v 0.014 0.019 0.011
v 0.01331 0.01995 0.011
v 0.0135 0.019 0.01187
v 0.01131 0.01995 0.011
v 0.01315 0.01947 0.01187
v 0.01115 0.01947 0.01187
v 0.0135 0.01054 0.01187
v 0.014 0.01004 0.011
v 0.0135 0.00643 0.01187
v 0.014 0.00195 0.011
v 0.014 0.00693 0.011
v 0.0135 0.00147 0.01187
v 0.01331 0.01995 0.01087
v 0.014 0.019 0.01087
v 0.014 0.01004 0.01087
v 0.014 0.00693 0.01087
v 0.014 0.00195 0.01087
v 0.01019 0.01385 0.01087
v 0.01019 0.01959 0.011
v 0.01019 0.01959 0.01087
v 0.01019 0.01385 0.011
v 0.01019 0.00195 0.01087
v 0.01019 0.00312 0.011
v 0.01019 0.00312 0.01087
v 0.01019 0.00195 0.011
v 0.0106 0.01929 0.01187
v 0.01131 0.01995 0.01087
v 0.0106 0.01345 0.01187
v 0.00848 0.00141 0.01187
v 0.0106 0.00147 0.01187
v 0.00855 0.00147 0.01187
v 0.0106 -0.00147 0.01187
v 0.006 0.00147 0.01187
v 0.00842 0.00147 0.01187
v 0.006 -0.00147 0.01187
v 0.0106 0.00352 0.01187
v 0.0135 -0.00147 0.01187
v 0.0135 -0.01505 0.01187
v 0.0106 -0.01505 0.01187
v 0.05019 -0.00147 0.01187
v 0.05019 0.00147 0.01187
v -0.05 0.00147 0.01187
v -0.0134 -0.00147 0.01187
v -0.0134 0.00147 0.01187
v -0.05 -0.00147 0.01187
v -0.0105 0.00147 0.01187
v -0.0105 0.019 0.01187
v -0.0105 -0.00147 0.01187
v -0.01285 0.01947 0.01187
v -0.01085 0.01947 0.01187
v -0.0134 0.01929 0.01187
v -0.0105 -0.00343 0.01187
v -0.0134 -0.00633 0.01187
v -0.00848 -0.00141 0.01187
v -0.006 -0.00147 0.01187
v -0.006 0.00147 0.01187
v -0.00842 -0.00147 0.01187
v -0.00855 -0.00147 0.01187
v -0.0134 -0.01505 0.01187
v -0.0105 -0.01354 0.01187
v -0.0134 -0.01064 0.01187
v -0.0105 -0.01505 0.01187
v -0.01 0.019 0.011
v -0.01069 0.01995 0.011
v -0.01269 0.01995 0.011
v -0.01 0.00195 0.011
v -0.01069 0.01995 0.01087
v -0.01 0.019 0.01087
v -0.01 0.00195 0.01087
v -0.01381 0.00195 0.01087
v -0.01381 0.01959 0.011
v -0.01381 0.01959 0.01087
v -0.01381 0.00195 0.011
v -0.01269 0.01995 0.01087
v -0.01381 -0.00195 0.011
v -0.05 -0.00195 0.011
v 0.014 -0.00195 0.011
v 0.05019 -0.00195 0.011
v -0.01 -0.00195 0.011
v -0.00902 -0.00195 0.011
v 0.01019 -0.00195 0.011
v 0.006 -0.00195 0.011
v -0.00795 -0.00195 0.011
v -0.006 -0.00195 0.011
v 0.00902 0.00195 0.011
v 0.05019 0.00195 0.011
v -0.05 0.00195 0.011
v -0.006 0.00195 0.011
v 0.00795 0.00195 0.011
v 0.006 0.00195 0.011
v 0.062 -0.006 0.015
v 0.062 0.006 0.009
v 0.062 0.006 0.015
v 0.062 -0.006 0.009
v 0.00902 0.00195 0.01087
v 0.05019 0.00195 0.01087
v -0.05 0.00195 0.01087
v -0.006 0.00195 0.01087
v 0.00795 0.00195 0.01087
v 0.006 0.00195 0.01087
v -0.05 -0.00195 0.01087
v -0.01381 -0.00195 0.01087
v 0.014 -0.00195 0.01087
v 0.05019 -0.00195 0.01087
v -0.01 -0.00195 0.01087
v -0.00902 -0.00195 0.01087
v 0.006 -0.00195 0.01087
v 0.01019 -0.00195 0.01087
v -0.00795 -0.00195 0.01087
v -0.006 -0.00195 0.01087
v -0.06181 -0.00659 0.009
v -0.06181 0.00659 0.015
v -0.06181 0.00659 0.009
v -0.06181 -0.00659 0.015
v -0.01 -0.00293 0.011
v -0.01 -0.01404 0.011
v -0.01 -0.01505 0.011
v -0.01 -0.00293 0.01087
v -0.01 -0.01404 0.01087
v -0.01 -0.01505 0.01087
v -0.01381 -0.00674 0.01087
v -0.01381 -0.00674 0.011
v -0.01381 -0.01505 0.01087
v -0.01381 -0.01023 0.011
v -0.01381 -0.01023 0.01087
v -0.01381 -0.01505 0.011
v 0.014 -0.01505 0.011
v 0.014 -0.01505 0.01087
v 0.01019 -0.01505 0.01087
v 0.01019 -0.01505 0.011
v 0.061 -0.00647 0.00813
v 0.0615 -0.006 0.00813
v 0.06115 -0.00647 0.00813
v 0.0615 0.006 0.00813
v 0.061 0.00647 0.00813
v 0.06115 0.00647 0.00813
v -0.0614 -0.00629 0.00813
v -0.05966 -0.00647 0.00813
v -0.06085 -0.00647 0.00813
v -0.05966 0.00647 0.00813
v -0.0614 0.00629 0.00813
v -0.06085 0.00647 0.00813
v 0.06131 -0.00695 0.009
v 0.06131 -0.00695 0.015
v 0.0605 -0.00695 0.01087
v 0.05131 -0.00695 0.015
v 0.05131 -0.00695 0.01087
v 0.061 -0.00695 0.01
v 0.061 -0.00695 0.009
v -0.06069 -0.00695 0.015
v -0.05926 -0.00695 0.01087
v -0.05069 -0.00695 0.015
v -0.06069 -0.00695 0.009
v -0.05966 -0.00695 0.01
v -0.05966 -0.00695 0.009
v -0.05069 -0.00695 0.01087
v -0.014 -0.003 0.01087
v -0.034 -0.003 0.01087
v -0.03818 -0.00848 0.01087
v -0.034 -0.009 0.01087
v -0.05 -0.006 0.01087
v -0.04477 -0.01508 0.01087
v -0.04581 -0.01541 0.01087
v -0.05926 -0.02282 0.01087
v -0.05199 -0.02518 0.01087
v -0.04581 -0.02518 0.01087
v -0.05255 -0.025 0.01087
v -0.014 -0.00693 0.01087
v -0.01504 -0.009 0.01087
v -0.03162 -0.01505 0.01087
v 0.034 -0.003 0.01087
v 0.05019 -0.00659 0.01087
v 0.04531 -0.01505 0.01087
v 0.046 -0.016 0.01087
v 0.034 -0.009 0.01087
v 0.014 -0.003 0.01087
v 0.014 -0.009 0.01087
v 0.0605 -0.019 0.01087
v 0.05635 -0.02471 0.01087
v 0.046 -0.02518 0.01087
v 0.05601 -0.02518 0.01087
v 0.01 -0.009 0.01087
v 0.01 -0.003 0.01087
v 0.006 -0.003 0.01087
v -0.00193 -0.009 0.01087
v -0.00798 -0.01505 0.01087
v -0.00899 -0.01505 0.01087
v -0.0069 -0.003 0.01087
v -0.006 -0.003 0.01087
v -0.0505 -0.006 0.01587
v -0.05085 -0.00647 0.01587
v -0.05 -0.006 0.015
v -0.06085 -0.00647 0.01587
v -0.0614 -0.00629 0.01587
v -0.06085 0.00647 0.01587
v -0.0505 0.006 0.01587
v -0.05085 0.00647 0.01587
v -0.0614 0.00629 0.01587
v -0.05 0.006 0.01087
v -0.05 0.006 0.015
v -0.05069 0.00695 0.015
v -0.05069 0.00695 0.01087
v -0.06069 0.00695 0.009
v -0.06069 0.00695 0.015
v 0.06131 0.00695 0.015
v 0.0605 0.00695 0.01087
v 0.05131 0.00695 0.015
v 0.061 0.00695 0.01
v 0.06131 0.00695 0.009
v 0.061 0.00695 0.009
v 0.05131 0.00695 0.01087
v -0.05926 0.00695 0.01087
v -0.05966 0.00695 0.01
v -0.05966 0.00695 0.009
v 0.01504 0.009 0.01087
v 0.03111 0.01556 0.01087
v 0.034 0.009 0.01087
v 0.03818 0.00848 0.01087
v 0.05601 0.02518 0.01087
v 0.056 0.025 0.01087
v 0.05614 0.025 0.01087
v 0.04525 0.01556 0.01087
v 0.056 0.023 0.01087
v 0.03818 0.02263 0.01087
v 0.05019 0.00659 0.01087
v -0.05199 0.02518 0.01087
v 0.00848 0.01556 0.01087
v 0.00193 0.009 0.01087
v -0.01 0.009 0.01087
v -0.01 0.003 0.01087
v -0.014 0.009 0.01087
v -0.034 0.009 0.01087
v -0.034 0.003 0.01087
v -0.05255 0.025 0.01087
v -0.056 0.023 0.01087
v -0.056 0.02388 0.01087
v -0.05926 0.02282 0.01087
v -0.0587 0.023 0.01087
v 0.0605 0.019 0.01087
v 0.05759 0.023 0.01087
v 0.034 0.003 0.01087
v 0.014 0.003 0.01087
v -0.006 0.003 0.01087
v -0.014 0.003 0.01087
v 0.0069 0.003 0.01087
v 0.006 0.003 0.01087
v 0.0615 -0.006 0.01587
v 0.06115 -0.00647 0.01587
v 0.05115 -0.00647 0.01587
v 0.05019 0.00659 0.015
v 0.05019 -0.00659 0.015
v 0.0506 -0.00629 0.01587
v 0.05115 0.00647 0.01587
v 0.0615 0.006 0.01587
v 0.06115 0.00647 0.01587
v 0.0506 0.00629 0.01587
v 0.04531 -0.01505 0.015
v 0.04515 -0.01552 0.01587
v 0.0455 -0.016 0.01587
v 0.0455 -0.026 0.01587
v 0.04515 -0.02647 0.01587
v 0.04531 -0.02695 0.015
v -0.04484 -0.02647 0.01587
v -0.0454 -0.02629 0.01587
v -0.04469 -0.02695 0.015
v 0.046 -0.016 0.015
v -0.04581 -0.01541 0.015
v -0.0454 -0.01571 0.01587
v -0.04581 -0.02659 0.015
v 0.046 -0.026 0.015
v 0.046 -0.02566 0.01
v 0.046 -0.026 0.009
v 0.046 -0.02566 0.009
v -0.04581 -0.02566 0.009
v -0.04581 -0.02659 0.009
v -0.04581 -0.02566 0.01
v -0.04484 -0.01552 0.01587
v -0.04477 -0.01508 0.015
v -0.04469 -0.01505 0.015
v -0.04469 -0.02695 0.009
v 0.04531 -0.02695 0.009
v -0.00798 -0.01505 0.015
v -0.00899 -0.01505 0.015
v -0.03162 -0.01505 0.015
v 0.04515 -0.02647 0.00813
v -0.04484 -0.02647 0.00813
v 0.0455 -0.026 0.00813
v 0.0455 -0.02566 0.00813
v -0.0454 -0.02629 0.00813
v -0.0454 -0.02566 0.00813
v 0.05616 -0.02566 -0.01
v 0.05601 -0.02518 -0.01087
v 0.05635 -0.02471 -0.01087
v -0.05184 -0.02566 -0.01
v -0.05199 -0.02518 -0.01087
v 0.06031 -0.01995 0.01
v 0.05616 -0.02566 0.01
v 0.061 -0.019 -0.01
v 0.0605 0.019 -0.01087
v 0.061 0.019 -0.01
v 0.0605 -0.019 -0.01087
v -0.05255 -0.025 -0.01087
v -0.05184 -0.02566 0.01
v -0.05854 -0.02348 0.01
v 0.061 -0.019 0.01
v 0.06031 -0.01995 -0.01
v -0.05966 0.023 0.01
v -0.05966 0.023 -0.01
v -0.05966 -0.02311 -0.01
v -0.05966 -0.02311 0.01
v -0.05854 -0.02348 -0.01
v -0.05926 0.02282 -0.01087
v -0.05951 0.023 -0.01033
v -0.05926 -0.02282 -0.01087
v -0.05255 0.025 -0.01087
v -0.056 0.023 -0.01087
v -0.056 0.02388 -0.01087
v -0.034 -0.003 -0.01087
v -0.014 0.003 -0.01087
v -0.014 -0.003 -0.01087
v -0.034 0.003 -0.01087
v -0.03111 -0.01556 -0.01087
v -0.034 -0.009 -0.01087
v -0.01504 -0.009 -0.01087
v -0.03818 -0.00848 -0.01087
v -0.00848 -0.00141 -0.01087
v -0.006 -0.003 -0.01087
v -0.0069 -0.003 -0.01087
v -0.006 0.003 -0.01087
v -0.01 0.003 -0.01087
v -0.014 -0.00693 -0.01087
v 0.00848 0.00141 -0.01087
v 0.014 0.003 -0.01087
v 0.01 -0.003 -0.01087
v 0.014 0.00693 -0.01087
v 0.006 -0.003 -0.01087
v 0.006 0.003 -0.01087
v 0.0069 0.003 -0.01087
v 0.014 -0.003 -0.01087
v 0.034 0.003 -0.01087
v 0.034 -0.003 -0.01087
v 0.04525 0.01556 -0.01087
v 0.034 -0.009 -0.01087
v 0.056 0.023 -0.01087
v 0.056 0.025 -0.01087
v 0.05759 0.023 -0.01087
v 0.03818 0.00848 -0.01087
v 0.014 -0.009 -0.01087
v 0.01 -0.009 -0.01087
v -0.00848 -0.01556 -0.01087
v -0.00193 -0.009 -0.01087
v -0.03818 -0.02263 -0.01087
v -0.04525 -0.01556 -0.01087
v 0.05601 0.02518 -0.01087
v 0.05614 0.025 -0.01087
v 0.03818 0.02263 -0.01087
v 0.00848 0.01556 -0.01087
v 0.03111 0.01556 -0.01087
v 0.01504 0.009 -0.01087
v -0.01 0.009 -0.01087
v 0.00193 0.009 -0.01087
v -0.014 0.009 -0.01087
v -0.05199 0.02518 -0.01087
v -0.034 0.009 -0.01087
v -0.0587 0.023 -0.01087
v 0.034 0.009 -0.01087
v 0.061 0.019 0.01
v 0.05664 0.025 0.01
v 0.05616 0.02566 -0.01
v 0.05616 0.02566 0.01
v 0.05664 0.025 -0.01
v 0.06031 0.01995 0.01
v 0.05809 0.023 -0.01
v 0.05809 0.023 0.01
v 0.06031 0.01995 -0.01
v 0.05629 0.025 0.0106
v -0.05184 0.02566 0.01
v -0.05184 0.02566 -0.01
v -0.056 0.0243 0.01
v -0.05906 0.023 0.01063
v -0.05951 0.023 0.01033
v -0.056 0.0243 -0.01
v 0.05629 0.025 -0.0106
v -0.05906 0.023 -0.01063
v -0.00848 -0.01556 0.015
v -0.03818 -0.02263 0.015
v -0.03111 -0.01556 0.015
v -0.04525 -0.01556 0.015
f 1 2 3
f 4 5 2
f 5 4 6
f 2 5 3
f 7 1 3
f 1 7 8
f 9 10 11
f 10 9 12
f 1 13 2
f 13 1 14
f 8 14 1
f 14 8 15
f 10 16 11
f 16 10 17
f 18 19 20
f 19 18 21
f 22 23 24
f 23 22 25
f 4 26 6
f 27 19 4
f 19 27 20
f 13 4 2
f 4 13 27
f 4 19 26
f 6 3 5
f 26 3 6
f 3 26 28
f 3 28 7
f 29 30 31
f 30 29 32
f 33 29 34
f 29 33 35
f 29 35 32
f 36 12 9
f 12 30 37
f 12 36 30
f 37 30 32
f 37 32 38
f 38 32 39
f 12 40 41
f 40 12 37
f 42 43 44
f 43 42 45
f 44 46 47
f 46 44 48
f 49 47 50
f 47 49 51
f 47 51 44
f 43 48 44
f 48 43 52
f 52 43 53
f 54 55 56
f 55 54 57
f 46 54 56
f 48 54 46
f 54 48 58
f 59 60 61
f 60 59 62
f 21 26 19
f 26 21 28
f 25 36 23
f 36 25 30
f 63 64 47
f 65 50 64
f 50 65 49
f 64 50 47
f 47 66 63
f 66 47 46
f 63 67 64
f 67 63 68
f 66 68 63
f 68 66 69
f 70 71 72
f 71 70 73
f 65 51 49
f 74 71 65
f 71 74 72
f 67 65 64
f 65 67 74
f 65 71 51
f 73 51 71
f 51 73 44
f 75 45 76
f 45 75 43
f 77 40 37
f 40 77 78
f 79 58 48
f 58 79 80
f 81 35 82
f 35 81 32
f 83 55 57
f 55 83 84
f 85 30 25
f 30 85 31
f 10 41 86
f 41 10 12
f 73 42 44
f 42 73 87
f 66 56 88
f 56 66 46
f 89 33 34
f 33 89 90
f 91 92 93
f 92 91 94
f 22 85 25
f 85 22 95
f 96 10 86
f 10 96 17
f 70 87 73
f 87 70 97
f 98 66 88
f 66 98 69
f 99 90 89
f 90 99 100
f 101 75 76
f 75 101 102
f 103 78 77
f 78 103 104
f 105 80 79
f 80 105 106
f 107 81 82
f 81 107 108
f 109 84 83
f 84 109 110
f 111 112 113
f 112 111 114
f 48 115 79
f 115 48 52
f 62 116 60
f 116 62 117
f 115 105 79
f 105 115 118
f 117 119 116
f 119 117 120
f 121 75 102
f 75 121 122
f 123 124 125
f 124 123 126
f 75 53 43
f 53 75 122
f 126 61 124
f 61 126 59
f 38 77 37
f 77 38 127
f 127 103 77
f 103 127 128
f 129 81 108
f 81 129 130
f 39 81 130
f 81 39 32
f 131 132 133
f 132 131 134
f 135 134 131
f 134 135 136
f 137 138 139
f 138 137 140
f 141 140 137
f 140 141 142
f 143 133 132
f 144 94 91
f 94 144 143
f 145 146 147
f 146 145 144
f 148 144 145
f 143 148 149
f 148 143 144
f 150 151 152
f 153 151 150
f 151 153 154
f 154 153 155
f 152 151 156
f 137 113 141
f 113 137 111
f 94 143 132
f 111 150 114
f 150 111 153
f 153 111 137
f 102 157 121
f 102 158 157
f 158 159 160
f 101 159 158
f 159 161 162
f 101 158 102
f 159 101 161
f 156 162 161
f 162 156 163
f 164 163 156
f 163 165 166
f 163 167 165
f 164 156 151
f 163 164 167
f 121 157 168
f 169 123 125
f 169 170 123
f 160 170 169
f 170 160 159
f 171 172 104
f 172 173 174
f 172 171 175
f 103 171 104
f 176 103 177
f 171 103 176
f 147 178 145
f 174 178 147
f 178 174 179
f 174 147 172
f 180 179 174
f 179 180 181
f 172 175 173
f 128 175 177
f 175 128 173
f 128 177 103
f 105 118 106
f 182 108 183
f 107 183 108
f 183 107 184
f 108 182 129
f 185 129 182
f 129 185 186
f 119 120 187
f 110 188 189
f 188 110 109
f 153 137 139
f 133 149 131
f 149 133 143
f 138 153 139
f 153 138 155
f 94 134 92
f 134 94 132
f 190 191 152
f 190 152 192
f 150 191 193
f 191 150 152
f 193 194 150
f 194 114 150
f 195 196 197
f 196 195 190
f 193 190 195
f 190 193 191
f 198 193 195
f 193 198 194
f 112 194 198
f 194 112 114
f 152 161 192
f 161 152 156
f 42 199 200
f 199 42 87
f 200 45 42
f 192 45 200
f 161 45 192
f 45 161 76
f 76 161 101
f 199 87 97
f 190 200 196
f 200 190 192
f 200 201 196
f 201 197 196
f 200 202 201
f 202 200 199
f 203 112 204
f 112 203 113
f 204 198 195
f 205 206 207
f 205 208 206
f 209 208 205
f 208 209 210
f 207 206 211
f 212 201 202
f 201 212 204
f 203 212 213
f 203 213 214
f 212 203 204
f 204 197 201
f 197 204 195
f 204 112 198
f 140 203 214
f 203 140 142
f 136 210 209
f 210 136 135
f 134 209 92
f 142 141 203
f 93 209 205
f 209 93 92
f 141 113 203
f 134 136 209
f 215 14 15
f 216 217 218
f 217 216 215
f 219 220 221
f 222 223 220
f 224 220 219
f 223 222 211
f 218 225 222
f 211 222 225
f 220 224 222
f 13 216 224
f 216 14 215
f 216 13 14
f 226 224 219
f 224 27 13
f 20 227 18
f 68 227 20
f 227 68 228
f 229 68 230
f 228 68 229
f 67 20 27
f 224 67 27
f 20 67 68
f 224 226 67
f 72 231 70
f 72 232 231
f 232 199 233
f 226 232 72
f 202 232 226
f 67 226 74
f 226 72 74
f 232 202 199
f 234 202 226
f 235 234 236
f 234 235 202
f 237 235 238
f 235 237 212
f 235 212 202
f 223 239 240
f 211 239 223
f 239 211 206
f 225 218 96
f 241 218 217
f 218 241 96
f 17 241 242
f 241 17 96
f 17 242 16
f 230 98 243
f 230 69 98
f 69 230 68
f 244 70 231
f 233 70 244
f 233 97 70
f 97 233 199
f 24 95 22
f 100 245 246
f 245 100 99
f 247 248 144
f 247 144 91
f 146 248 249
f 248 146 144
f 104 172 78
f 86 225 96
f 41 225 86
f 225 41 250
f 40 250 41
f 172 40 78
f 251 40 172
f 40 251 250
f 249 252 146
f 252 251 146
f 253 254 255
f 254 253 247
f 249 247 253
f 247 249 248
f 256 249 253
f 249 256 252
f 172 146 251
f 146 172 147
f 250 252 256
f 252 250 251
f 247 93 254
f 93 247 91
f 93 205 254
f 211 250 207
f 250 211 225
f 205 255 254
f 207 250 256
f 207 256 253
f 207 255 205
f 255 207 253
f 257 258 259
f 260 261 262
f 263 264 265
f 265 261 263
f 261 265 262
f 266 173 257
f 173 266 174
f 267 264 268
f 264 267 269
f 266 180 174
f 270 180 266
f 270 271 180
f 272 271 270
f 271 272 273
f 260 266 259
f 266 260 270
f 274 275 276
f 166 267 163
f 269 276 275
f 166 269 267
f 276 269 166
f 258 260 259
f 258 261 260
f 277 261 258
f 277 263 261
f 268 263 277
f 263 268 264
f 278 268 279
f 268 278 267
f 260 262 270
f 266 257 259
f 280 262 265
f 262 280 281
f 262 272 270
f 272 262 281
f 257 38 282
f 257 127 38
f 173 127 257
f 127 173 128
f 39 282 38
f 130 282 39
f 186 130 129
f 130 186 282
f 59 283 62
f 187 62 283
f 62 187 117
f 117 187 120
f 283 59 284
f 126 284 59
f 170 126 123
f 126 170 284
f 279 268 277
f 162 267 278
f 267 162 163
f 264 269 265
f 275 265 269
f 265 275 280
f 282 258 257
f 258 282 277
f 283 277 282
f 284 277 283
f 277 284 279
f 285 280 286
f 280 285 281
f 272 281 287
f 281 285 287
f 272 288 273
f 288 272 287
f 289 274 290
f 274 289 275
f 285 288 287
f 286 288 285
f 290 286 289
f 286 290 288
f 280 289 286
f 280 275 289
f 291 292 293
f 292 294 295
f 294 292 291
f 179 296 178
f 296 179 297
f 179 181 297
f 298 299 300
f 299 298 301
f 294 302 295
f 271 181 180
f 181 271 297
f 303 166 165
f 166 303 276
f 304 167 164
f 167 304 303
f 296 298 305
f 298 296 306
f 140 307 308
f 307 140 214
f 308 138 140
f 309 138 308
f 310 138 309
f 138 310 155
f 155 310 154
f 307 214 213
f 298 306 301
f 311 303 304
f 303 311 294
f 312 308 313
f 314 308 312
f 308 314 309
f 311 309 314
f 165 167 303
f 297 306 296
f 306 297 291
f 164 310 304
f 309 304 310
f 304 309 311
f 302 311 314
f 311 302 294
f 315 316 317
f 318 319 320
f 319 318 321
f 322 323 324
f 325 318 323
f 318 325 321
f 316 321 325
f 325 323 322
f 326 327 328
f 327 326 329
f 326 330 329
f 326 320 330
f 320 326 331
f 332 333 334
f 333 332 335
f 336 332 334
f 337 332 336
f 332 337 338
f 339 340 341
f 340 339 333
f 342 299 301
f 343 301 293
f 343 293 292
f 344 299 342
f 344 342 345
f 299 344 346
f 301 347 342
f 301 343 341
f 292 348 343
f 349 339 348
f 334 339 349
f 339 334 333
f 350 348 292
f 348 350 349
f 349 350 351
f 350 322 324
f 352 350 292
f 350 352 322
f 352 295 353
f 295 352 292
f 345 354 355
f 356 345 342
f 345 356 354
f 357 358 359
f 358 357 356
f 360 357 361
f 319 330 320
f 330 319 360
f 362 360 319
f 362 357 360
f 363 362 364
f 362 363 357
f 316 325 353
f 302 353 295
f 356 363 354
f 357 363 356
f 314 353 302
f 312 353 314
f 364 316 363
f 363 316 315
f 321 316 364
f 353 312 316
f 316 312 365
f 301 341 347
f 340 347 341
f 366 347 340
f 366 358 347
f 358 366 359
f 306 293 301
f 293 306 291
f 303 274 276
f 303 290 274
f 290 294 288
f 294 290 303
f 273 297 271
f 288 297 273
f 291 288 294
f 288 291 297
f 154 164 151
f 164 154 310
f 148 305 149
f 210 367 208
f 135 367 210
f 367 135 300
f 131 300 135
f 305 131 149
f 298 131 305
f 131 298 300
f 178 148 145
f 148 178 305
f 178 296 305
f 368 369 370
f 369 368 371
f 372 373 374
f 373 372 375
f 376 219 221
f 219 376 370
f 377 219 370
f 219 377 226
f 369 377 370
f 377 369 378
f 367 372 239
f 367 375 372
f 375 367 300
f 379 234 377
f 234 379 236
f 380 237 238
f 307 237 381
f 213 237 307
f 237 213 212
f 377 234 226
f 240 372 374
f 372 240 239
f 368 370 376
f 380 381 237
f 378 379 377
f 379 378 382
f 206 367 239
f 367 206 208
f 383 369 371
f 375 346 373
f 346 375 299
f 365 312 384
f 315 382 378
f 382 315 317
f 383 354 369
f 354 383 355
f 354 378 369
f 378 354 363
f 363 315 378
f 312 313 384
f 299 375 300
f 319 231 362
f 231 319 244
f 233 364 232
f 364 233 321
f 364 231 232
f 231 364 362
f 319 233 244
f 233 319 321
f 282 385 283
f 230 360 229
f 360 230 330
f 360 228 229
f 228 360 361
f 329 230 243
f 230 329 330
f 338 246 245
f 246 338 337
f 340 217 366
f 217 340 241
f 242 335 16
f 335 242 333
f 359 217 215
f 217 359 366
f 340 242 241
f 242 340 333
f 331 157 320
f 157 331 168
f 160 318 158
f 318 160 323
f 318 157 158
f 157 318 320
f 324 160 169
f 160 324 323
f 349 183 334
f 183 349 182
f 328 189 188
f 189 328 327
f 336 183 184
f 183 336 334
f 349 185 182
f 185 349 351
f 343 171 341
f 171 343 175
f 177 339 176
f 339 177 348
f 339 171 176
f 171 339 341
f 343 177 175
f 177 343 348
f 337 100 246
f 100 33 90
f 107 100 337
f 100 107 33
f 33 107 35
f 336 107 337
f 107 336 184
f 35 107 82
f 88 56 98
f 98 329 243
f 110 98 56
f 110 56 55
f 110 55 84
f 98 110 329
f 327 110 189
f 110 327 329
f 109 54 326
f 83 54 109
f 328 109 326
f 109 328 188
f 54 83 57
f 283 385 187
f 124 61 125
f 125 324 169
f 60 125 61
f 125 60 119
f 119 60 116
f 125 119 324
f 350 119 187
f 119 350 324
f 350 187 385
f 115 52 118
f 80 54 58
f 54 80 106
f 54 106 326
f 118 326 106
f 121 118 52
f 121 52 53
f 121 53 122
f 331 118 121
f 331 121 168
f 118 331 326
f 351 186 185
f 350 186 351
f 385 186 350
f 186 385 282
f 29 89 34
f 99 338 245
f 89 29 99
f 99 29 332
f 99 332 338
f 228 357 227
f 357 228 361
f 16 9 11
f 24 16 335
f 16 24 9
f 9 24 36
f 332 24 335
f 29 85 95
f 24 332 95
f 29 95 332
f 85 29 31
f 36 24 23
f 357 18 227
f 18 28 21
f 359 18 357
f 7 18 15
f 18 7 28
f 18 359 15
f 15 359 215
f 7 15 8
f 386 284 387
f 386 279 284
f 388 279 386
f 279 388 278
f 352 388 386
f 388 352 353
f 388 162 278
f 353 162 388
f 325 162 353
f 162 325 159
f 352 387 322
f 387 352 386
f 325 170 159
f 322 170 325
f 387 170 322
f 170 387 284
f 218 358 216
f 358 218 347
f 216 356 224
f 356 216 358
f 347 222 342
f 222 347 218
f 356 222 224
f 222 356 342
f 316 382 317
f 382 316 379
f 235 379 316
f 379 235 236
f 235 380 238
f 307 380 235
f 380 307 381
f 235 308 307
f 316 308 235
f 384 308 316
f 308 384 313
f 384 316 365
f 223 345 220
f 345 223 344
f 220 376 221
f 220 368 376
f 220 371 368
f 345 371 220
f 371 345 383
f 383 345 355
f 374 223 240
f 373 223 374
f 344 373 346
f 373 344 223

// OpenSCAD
// Parameters
L = 0.12; //[0.06:0.24:0.001]
W = 0.05; //[0.025:0.1:0.001]
T = 0.02; //[0.01:0.04:0.001]
corner_r = 0.006; //[0.003:0.012:0.001]
edge_margin_x = 0.008; //[0.004:0.016:0.001]
edge_margin_y = 0.006; //[0.003:0.012:0.001]
slot_len = 0.02; //[0.01:0.04:0.001]
slot_w = 0.006; //[0.003:0.012:0.001]
slot_hex_flat = 0.006; //[0.003:0.012:0.001]
slot_row_pitch_y = 0.012; //[0.006:0.024:0.001]
slot_col_pitch_x = 0.024; //[0.012:0.048:0.001]
diamond_w = 0.01; //[0.005:0.02:0.001]
diamond_h = 0.01; //[0.005:0.02:0.001]
diamond_offset_x = 0.0; //[0.0:0.02:0.001]
diamond_offset_y = 0.0; //[0.0:0.02:0.001]
tri_side = 0.01; //[0.005:0.02:0.001]
tri_offset_x = 0.038; //[0.019:0.076:0.001]
tri_offset_y = 0.016; //[0.008:0.032:0.001]
step_len = 0.09; //[0.045:0.18:0.001]
step_w = 0.01; //[0.005:0.02:0.001]
step_h = 0.006; //[0.003:0.012:0.001]
step_edge_offset_y = 0.0; //[-0.01:0.01:0.001]
end_block_len = 0.01; //[0.005:0.02:0.001]
end_block_w = 0.012; //[0.006:0.024:0.001]
end_block_h = 0.006; //[0.003:0.012:0.001]
end_block_chamfer = 0.003; //[0.0015:0.006:0.0005]
micro_round_r = 0.001; //[0.0005:0.002:0.0005]
overlap = 0.001; //[0.0005:0.002:0.0005]
cut_extra_z = 0.01; //[0.005:0.02:0.001]
rib_w = 0.002; //[0.001:0.004:0.0005]
rib_h = 0.002; //[0.001:0.004:0.0005]
notch_w = 0.004; //[0.002:0.008:0.001]
notch_d = 0.002; //[0.001:0.004:0.0005]

// Base Shapes
module rr_corner_cyl_1() {
  translate([L/2 - corner_r, W/2 - corner_r, 0])
    cylinder(r=corner_r, h=T, center=true);
}

module rr_corner_cyl_2() {
  translate([-L/2 + corner_r, W/2 - corner_r, 0])
    cylinder(r=corner_r, h=T, center=true);
}

module rr_corner_cyl_3() {
  translate([-L/2 + corner_r, -W/2 + corner_r, 0])
    cylinder(r=corner_r, h=T, center=true);
}

module rr_corner_cyl_4() {
  translate([L/2 - corner_r, -W/2 + corner_r, 0])
    cylinder(r=corner_r, h=T, center=true);
}

module step_base_raw() {
  translate([0, -W/2 + step_w/2 + step_edge_offset_y - overlap, T/2 + step_h/2 - overlap])
    cube([step_len, step_w, step_h], center=true);
}

module end_block_left_big() {
  translate([-L/2 + end_block_len/2 - overlap, 0, T/2 + end_block_h/2 - overlap])
    cube([end_block_len, end_block_w, end_block_h], center=true);
}

module end_block_left_small() {
  translate([-L/2 + end_block_len/2 - overlap, 0, T/2 + end_block_h/2 - overlap])
    cube([end_block_len - 2*end_block_chamfer, end_block_w - 2*end_block_chamfer, end_block_h], center=true);
}

module end_block_right_big() {
  translate([L/2 - end_block_len/2 + overlap, 0, T/2 + end_block_h/2 - overlap])
    cube([end_block_len, end_block_w, end_block_h], center=true);
}

module end_block_right_small() {
  translate([L/2 - end_block_len/2 + overlap, 0, T/2 + end_block_h/2 - overlap])
    cube([end_block_len - 2*end_block_chamfer, end_block_w - 2*end_block_chamfer, end_block_h], center=true);
}

module rib_between_rows_1() {
  translate([0, 0, T/2 + rib_h/2 - overlap])
    cube([L - 2*edge_margin_x, rib_w, rib_h], center=true);
}

module rib_between_cols_1() {
  translate([-slot_col_pitch_x/2, 0, T/2 + rib_h/2 - overlap])
    cube([rib_w, W - 2*edge_margin_y, rib_h], center=true);
}

module rib_between_cols_2() {
  translate([slot_col_pitch_x/2, 0, T/2 + rib_h/2 - overlap])
    cube([rib_w, W - 2*edge_margin_y, rib_h], center=true);
}

module notch_cut_left() {
  translate([-L/2 + notch_w/2, W/2 - notch_d/2, 0])
    cube([notch_w, notch_d, T + cut_extra_z], center=true);
}

module notch_cut_right() {
  translate([L/2 - notch_w/2, W/2 - notch_d/2, 0])
    cube([notch_w, notch_d, T + cut_extra_z], center=true);
}

module slot_cut_r1c1() {
  translate([-slot_col_pitch_x, slot_row_pitch_y/2, 0])
    cube([slot_len, slot_w, T + cut_extra_z], center=true);
}

module slot_cut_r1c2() {
  translate([0, slot_row_pitch_y/2, 0])
    cube([slot_len, slot_w, T + cut_extra_z], center=true);
}

module slot_cut_r1c3() {
  translate([slot_col_pitch_x, slot_row_pitch_y/2, 0])
    cube([slot_len, slot_w, T + cut_extra_z], center=true);
}

module slot_cut_r2c1() {
  translate([-slot_col_pitch_x, -slot_row_pitch_y/2, 0])
    cube([slot_len, slot_w, T + cut_extra_z], center=true);
}

module slot_cut_r2c2() {
  translate([0, -slot_row_pitch_y/2, 0])
    cube([slot_len, slot_w, T + cut_extra_z], center=true);
}

module slot_cut_r2c3() {
  translate([slot_col_pitch_x, -slot_row_pitch_y/2, 0])
    cube([slot_len, slot_w, T + cut_extra_z], center=true);
}

module hex_like_cut_center() {
  translate([0, 0, 0])
    cube([slot_len*0.6, slot_hex_flat, T + cut_extra_z], center=true);
}

module diamond_cut_1_raw() {
  translate([diamond_offset_x - slot_col_pitch_x/2, diamond_offset_y, 0])
    cube([diamond_w, diamond_h, T + cut_extra_z], center=true);
}

module diamond_cut_2_raw() {
  translate([diamond_offset_x + slot_col_pitch_x/2, diamond_offset_y, 0])
    cube([diamond_w, diamond_h, T + cut_extra_z], center=true);
}

module tri_cut_1_raw() {
  translate([tri_offset_x, tri_offset_y, 0])
    cube([tri_side, tri_side, T + cut_extra_z], center=true);
}

module tri_cut_2_raw() {
  translate([-tri_offset_x, tri_offset_y, 0])
    cube([tri_side, tri_side, T + cut_extra_z], center=true);
}

module tri_cut_3_raw() {
  translate([tri_offset_x, -tri_offset_y, 0])
    cube([tri_side, tri_side, T + cut_extra_z], center=true);
}

module tri_cut_4_raw() {
  translate([-tri_offset_x, -tri_offset_y, 0])
    cube([tri_side, tri_side, T + cut_extra_z], center=true);
}

module micro_round_sphere() {
  translate([0, 0, 0])
    sphere(r=micro_round_r, center=true);
}

// Operations
module main_plate_rounded_rectangle() {
  hull() {
    rr_corner_cyl_1();
    rr_corner_cyl_2();
    rr_corner_cyl_3();
    rr_corner_cyl_4();
  }
}

module chamfered_corner_end_block_left() {
  hull() {
    end_block_left_big();
    end_block_left_small();
  }
}

module chamfered_corner_end_block_right() {
  hull() {
    end_block_right_big();
    end_block_right_small();
  }
}

module chamfered_corner_end_blocks() {
  union() {
    chamfered_corner_end_block_left();
    chamfered_corner_end_block_right();
  }
}

module stepped_base_along_long_edge() {
  step_base_raw();
}

module decorative_spacing_ribs_between_cutouts() {
  union() {
    rib_between_rows_1();
    rib_between_cols_1();
    rib_between_cols_2();
  }
}

module panel_with_addons_union() {
  union() {
    main_plate_rounded_rectangle();
    stepped_base_along_long_edge();
    chamfered_corner_end_blocks();
    decorative_spacing_ribs_between_cutouts();
  }
}

module edge_fillet_micro_rounding() {
  minkowski() {
    panel_with_addons_union();
    micro_round_sphere();
  }
}

module through_cutout_pattern_slots_hex() {
  union() {
    slot_cut_r1c1();
    slot_cut_r1c2();
    slot_cut_r1c3();
    slot_cut_r2c1();
    slot_cut_r2c2();
    slot_cut_r2c3();
    hex_like_cut_center();
  }
}

module diamond_cut_1_rot() {
  rotate([0, 0, 45]) diamond_cut_1_raw();
}

module diamond_cut_2_rot() {
  rotate([0, 0, 45]) diamond_cut_2_raw();
}

module through_cutout_pattern_diamonds() {
  union() {
    diamond_cut_1_rot();
    diamond_cut_2_rot();
  }
}

module tri_cut_1_rot() {
  rotate([0, 0, 45]) tri_cut_1_raw();
}

module tri_cut_2_rot() {
  rotate([0, 0, 45]) tri_cut_2_raw();
}

module tri_cut_3_rot() {
  rotate([0, 0, 45]) tri_cut_3_raw();
}

module tri_cut_4_rot() {
  rotate([0, 0, 45]) tri_cut_4_raw();
}

module through_cutout_pattern_triangles() {
  union() {
    tri_cut_1_rot();
    tri_cut_2_rot();
    tri_cut_3_rot();
    tri_cut_4_rot();
  }
}

module tiny_alignment_notches() {
  union() {
    notch_cut_left();
    notch_cut_right();
  }
}

module all_through_cutouts_union() {
  union() {
    through_cutout_pattern_slots_hex();
    through_cutout_pattern_diamonds();
    through_cutout_pattern_triangles();
    tiny_alignment_notches();
  }
}

module final_panel_with_cutouts() {
  difference() {
    edge_fillet_micro_rounding();
    all_through_cutouts_union();
  }
}

// Final Output
final_panel_with_cutouts();
